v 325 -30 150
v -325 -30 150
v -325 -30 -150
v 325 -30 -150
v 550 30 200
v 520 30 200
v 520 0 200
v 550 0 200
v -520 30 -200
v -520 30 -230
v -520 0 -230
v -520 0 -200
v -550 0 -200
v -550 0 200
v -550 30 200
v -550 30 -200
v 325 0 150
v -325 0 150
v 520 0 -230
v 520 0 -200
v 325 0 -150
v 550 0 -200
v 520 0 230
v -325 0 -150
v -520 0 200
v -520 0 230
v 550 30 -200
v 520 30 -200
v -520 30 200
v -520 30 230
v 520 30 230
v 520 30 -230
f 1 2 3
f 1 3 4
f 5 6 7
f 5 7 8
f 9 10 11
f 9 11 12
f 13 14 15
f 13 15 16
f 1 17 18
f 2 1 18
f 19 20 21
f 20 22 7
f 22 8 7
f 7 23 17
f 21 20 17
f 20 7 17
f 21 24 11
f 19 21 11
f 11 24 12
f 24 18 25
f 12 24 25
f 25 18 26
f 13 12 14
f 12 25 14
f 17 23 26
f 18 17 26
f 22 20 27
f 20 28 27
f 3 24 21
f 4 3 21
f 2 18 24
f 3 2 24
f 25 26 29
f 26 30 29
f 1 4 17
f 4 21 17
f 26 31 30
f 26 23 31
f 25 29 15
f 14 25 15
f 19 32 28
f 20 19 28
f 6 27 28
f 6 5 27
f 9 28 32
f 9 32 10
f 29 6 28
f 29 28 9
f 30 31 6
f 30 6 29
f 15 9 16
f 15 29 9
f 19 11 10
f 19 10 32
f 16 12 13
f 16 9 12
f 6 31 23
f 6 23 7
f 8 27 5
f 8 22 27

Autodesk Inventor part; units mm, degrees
ref_plane "YZ Plane" through (0, 0, 0) normal (1, 0, 0) x (0, 1, 0)
ref_plane "XZ Plane" through (0, 0, 0) normal (0, 1, 0) x (-1, 0, 0)
ref_plane "XY Plane" through (0, 0, 0) normal (0, 0, 1) x (1, 0, 0)
sketch "Sketch1" plane through (0, 0, 0) normal (0, 1, 0) x (-1, 0, 0)
  line L0 (-550, 230) -> (550, 230)
  line L1 (550, 230) -> (550, -230)
  line L2 (550, -230) -> (-550, -230)
  line L3 (-550, -230) -> (-550, 230)
  line L4 (-550, 230) -> (550, -230) construction
  line L5 (550, 230) -> (-550, -230) construction
  point P0 (0, 0)
  dimension "d0" = 1100
  dimension "d1" = 460
extrude "Extrusion1" add sketch "Sketch1" along normal blind 30
sketch "Sketch2" plane through (0, 30, 0) normal (0, 1, 0) x (1, 0, 0)
  line L0 (-550, 230) -> (-550, -230) projected
  line L1 (-550, -230) -> (-520, -230)
  line L2 (-520, -230) -> (-520, -200)
  line L3 (-520, -200) -> (-550, -200)
  line L4 (-550, -200) -> (-550, -230)
  line L5 (-550, 230) -> (-520, 230)
  line L6 (-520, 230) -> (-520, 200)
  line L7 (-520, 200) -> (-550, 200)
  line L8 (-550, 200) -> (-550, 230)
  line L9 (550, -230) -> (550, 230) projected
  line L10 (550, -230) -> (520, -230)
  line L11 (520, -230) -> (520, -200)
  line L12 (520, -200) -> (550, -200)
  line L13 (550, -200) -> (550, -230)
  line L14 (550, 230) -> (520, 230)
  line L15 (520, 230) -> (520, 200)
  line L16 (520, 200) -> (550, 200)
  line L17 (550, 200) -> (550, 230)
  point P0 (0, 0)
  dimension "d6" = 30
  dimension "d7" = 30
extrude "Extrusion2" cut sketch "Sketch2" against normal blind 30
sketch "Sketch3" plane through (0, 0, 0) normal (0, -1, 0) x (1, 0, 0)
  line L0 (-325, -150) -> (325, -150)
  line L1 (325, -150) -> (325, 150)
  line L2 (325, 150) -> (-325, 150)
  line L3 (-325, 150) -> (-325, -150)
  line L4 (-325, -150) -> (325, 150) construction
  line L5 (325, -150) -> (-325, 150) construction
  point P0 (0, 0)
  dimension "d10" = 650
  dimension "d11" = 300
extrude "Extrusion3" add sketch "Sketch3" along normal blind 30
properties part number "Platform_Arm"
